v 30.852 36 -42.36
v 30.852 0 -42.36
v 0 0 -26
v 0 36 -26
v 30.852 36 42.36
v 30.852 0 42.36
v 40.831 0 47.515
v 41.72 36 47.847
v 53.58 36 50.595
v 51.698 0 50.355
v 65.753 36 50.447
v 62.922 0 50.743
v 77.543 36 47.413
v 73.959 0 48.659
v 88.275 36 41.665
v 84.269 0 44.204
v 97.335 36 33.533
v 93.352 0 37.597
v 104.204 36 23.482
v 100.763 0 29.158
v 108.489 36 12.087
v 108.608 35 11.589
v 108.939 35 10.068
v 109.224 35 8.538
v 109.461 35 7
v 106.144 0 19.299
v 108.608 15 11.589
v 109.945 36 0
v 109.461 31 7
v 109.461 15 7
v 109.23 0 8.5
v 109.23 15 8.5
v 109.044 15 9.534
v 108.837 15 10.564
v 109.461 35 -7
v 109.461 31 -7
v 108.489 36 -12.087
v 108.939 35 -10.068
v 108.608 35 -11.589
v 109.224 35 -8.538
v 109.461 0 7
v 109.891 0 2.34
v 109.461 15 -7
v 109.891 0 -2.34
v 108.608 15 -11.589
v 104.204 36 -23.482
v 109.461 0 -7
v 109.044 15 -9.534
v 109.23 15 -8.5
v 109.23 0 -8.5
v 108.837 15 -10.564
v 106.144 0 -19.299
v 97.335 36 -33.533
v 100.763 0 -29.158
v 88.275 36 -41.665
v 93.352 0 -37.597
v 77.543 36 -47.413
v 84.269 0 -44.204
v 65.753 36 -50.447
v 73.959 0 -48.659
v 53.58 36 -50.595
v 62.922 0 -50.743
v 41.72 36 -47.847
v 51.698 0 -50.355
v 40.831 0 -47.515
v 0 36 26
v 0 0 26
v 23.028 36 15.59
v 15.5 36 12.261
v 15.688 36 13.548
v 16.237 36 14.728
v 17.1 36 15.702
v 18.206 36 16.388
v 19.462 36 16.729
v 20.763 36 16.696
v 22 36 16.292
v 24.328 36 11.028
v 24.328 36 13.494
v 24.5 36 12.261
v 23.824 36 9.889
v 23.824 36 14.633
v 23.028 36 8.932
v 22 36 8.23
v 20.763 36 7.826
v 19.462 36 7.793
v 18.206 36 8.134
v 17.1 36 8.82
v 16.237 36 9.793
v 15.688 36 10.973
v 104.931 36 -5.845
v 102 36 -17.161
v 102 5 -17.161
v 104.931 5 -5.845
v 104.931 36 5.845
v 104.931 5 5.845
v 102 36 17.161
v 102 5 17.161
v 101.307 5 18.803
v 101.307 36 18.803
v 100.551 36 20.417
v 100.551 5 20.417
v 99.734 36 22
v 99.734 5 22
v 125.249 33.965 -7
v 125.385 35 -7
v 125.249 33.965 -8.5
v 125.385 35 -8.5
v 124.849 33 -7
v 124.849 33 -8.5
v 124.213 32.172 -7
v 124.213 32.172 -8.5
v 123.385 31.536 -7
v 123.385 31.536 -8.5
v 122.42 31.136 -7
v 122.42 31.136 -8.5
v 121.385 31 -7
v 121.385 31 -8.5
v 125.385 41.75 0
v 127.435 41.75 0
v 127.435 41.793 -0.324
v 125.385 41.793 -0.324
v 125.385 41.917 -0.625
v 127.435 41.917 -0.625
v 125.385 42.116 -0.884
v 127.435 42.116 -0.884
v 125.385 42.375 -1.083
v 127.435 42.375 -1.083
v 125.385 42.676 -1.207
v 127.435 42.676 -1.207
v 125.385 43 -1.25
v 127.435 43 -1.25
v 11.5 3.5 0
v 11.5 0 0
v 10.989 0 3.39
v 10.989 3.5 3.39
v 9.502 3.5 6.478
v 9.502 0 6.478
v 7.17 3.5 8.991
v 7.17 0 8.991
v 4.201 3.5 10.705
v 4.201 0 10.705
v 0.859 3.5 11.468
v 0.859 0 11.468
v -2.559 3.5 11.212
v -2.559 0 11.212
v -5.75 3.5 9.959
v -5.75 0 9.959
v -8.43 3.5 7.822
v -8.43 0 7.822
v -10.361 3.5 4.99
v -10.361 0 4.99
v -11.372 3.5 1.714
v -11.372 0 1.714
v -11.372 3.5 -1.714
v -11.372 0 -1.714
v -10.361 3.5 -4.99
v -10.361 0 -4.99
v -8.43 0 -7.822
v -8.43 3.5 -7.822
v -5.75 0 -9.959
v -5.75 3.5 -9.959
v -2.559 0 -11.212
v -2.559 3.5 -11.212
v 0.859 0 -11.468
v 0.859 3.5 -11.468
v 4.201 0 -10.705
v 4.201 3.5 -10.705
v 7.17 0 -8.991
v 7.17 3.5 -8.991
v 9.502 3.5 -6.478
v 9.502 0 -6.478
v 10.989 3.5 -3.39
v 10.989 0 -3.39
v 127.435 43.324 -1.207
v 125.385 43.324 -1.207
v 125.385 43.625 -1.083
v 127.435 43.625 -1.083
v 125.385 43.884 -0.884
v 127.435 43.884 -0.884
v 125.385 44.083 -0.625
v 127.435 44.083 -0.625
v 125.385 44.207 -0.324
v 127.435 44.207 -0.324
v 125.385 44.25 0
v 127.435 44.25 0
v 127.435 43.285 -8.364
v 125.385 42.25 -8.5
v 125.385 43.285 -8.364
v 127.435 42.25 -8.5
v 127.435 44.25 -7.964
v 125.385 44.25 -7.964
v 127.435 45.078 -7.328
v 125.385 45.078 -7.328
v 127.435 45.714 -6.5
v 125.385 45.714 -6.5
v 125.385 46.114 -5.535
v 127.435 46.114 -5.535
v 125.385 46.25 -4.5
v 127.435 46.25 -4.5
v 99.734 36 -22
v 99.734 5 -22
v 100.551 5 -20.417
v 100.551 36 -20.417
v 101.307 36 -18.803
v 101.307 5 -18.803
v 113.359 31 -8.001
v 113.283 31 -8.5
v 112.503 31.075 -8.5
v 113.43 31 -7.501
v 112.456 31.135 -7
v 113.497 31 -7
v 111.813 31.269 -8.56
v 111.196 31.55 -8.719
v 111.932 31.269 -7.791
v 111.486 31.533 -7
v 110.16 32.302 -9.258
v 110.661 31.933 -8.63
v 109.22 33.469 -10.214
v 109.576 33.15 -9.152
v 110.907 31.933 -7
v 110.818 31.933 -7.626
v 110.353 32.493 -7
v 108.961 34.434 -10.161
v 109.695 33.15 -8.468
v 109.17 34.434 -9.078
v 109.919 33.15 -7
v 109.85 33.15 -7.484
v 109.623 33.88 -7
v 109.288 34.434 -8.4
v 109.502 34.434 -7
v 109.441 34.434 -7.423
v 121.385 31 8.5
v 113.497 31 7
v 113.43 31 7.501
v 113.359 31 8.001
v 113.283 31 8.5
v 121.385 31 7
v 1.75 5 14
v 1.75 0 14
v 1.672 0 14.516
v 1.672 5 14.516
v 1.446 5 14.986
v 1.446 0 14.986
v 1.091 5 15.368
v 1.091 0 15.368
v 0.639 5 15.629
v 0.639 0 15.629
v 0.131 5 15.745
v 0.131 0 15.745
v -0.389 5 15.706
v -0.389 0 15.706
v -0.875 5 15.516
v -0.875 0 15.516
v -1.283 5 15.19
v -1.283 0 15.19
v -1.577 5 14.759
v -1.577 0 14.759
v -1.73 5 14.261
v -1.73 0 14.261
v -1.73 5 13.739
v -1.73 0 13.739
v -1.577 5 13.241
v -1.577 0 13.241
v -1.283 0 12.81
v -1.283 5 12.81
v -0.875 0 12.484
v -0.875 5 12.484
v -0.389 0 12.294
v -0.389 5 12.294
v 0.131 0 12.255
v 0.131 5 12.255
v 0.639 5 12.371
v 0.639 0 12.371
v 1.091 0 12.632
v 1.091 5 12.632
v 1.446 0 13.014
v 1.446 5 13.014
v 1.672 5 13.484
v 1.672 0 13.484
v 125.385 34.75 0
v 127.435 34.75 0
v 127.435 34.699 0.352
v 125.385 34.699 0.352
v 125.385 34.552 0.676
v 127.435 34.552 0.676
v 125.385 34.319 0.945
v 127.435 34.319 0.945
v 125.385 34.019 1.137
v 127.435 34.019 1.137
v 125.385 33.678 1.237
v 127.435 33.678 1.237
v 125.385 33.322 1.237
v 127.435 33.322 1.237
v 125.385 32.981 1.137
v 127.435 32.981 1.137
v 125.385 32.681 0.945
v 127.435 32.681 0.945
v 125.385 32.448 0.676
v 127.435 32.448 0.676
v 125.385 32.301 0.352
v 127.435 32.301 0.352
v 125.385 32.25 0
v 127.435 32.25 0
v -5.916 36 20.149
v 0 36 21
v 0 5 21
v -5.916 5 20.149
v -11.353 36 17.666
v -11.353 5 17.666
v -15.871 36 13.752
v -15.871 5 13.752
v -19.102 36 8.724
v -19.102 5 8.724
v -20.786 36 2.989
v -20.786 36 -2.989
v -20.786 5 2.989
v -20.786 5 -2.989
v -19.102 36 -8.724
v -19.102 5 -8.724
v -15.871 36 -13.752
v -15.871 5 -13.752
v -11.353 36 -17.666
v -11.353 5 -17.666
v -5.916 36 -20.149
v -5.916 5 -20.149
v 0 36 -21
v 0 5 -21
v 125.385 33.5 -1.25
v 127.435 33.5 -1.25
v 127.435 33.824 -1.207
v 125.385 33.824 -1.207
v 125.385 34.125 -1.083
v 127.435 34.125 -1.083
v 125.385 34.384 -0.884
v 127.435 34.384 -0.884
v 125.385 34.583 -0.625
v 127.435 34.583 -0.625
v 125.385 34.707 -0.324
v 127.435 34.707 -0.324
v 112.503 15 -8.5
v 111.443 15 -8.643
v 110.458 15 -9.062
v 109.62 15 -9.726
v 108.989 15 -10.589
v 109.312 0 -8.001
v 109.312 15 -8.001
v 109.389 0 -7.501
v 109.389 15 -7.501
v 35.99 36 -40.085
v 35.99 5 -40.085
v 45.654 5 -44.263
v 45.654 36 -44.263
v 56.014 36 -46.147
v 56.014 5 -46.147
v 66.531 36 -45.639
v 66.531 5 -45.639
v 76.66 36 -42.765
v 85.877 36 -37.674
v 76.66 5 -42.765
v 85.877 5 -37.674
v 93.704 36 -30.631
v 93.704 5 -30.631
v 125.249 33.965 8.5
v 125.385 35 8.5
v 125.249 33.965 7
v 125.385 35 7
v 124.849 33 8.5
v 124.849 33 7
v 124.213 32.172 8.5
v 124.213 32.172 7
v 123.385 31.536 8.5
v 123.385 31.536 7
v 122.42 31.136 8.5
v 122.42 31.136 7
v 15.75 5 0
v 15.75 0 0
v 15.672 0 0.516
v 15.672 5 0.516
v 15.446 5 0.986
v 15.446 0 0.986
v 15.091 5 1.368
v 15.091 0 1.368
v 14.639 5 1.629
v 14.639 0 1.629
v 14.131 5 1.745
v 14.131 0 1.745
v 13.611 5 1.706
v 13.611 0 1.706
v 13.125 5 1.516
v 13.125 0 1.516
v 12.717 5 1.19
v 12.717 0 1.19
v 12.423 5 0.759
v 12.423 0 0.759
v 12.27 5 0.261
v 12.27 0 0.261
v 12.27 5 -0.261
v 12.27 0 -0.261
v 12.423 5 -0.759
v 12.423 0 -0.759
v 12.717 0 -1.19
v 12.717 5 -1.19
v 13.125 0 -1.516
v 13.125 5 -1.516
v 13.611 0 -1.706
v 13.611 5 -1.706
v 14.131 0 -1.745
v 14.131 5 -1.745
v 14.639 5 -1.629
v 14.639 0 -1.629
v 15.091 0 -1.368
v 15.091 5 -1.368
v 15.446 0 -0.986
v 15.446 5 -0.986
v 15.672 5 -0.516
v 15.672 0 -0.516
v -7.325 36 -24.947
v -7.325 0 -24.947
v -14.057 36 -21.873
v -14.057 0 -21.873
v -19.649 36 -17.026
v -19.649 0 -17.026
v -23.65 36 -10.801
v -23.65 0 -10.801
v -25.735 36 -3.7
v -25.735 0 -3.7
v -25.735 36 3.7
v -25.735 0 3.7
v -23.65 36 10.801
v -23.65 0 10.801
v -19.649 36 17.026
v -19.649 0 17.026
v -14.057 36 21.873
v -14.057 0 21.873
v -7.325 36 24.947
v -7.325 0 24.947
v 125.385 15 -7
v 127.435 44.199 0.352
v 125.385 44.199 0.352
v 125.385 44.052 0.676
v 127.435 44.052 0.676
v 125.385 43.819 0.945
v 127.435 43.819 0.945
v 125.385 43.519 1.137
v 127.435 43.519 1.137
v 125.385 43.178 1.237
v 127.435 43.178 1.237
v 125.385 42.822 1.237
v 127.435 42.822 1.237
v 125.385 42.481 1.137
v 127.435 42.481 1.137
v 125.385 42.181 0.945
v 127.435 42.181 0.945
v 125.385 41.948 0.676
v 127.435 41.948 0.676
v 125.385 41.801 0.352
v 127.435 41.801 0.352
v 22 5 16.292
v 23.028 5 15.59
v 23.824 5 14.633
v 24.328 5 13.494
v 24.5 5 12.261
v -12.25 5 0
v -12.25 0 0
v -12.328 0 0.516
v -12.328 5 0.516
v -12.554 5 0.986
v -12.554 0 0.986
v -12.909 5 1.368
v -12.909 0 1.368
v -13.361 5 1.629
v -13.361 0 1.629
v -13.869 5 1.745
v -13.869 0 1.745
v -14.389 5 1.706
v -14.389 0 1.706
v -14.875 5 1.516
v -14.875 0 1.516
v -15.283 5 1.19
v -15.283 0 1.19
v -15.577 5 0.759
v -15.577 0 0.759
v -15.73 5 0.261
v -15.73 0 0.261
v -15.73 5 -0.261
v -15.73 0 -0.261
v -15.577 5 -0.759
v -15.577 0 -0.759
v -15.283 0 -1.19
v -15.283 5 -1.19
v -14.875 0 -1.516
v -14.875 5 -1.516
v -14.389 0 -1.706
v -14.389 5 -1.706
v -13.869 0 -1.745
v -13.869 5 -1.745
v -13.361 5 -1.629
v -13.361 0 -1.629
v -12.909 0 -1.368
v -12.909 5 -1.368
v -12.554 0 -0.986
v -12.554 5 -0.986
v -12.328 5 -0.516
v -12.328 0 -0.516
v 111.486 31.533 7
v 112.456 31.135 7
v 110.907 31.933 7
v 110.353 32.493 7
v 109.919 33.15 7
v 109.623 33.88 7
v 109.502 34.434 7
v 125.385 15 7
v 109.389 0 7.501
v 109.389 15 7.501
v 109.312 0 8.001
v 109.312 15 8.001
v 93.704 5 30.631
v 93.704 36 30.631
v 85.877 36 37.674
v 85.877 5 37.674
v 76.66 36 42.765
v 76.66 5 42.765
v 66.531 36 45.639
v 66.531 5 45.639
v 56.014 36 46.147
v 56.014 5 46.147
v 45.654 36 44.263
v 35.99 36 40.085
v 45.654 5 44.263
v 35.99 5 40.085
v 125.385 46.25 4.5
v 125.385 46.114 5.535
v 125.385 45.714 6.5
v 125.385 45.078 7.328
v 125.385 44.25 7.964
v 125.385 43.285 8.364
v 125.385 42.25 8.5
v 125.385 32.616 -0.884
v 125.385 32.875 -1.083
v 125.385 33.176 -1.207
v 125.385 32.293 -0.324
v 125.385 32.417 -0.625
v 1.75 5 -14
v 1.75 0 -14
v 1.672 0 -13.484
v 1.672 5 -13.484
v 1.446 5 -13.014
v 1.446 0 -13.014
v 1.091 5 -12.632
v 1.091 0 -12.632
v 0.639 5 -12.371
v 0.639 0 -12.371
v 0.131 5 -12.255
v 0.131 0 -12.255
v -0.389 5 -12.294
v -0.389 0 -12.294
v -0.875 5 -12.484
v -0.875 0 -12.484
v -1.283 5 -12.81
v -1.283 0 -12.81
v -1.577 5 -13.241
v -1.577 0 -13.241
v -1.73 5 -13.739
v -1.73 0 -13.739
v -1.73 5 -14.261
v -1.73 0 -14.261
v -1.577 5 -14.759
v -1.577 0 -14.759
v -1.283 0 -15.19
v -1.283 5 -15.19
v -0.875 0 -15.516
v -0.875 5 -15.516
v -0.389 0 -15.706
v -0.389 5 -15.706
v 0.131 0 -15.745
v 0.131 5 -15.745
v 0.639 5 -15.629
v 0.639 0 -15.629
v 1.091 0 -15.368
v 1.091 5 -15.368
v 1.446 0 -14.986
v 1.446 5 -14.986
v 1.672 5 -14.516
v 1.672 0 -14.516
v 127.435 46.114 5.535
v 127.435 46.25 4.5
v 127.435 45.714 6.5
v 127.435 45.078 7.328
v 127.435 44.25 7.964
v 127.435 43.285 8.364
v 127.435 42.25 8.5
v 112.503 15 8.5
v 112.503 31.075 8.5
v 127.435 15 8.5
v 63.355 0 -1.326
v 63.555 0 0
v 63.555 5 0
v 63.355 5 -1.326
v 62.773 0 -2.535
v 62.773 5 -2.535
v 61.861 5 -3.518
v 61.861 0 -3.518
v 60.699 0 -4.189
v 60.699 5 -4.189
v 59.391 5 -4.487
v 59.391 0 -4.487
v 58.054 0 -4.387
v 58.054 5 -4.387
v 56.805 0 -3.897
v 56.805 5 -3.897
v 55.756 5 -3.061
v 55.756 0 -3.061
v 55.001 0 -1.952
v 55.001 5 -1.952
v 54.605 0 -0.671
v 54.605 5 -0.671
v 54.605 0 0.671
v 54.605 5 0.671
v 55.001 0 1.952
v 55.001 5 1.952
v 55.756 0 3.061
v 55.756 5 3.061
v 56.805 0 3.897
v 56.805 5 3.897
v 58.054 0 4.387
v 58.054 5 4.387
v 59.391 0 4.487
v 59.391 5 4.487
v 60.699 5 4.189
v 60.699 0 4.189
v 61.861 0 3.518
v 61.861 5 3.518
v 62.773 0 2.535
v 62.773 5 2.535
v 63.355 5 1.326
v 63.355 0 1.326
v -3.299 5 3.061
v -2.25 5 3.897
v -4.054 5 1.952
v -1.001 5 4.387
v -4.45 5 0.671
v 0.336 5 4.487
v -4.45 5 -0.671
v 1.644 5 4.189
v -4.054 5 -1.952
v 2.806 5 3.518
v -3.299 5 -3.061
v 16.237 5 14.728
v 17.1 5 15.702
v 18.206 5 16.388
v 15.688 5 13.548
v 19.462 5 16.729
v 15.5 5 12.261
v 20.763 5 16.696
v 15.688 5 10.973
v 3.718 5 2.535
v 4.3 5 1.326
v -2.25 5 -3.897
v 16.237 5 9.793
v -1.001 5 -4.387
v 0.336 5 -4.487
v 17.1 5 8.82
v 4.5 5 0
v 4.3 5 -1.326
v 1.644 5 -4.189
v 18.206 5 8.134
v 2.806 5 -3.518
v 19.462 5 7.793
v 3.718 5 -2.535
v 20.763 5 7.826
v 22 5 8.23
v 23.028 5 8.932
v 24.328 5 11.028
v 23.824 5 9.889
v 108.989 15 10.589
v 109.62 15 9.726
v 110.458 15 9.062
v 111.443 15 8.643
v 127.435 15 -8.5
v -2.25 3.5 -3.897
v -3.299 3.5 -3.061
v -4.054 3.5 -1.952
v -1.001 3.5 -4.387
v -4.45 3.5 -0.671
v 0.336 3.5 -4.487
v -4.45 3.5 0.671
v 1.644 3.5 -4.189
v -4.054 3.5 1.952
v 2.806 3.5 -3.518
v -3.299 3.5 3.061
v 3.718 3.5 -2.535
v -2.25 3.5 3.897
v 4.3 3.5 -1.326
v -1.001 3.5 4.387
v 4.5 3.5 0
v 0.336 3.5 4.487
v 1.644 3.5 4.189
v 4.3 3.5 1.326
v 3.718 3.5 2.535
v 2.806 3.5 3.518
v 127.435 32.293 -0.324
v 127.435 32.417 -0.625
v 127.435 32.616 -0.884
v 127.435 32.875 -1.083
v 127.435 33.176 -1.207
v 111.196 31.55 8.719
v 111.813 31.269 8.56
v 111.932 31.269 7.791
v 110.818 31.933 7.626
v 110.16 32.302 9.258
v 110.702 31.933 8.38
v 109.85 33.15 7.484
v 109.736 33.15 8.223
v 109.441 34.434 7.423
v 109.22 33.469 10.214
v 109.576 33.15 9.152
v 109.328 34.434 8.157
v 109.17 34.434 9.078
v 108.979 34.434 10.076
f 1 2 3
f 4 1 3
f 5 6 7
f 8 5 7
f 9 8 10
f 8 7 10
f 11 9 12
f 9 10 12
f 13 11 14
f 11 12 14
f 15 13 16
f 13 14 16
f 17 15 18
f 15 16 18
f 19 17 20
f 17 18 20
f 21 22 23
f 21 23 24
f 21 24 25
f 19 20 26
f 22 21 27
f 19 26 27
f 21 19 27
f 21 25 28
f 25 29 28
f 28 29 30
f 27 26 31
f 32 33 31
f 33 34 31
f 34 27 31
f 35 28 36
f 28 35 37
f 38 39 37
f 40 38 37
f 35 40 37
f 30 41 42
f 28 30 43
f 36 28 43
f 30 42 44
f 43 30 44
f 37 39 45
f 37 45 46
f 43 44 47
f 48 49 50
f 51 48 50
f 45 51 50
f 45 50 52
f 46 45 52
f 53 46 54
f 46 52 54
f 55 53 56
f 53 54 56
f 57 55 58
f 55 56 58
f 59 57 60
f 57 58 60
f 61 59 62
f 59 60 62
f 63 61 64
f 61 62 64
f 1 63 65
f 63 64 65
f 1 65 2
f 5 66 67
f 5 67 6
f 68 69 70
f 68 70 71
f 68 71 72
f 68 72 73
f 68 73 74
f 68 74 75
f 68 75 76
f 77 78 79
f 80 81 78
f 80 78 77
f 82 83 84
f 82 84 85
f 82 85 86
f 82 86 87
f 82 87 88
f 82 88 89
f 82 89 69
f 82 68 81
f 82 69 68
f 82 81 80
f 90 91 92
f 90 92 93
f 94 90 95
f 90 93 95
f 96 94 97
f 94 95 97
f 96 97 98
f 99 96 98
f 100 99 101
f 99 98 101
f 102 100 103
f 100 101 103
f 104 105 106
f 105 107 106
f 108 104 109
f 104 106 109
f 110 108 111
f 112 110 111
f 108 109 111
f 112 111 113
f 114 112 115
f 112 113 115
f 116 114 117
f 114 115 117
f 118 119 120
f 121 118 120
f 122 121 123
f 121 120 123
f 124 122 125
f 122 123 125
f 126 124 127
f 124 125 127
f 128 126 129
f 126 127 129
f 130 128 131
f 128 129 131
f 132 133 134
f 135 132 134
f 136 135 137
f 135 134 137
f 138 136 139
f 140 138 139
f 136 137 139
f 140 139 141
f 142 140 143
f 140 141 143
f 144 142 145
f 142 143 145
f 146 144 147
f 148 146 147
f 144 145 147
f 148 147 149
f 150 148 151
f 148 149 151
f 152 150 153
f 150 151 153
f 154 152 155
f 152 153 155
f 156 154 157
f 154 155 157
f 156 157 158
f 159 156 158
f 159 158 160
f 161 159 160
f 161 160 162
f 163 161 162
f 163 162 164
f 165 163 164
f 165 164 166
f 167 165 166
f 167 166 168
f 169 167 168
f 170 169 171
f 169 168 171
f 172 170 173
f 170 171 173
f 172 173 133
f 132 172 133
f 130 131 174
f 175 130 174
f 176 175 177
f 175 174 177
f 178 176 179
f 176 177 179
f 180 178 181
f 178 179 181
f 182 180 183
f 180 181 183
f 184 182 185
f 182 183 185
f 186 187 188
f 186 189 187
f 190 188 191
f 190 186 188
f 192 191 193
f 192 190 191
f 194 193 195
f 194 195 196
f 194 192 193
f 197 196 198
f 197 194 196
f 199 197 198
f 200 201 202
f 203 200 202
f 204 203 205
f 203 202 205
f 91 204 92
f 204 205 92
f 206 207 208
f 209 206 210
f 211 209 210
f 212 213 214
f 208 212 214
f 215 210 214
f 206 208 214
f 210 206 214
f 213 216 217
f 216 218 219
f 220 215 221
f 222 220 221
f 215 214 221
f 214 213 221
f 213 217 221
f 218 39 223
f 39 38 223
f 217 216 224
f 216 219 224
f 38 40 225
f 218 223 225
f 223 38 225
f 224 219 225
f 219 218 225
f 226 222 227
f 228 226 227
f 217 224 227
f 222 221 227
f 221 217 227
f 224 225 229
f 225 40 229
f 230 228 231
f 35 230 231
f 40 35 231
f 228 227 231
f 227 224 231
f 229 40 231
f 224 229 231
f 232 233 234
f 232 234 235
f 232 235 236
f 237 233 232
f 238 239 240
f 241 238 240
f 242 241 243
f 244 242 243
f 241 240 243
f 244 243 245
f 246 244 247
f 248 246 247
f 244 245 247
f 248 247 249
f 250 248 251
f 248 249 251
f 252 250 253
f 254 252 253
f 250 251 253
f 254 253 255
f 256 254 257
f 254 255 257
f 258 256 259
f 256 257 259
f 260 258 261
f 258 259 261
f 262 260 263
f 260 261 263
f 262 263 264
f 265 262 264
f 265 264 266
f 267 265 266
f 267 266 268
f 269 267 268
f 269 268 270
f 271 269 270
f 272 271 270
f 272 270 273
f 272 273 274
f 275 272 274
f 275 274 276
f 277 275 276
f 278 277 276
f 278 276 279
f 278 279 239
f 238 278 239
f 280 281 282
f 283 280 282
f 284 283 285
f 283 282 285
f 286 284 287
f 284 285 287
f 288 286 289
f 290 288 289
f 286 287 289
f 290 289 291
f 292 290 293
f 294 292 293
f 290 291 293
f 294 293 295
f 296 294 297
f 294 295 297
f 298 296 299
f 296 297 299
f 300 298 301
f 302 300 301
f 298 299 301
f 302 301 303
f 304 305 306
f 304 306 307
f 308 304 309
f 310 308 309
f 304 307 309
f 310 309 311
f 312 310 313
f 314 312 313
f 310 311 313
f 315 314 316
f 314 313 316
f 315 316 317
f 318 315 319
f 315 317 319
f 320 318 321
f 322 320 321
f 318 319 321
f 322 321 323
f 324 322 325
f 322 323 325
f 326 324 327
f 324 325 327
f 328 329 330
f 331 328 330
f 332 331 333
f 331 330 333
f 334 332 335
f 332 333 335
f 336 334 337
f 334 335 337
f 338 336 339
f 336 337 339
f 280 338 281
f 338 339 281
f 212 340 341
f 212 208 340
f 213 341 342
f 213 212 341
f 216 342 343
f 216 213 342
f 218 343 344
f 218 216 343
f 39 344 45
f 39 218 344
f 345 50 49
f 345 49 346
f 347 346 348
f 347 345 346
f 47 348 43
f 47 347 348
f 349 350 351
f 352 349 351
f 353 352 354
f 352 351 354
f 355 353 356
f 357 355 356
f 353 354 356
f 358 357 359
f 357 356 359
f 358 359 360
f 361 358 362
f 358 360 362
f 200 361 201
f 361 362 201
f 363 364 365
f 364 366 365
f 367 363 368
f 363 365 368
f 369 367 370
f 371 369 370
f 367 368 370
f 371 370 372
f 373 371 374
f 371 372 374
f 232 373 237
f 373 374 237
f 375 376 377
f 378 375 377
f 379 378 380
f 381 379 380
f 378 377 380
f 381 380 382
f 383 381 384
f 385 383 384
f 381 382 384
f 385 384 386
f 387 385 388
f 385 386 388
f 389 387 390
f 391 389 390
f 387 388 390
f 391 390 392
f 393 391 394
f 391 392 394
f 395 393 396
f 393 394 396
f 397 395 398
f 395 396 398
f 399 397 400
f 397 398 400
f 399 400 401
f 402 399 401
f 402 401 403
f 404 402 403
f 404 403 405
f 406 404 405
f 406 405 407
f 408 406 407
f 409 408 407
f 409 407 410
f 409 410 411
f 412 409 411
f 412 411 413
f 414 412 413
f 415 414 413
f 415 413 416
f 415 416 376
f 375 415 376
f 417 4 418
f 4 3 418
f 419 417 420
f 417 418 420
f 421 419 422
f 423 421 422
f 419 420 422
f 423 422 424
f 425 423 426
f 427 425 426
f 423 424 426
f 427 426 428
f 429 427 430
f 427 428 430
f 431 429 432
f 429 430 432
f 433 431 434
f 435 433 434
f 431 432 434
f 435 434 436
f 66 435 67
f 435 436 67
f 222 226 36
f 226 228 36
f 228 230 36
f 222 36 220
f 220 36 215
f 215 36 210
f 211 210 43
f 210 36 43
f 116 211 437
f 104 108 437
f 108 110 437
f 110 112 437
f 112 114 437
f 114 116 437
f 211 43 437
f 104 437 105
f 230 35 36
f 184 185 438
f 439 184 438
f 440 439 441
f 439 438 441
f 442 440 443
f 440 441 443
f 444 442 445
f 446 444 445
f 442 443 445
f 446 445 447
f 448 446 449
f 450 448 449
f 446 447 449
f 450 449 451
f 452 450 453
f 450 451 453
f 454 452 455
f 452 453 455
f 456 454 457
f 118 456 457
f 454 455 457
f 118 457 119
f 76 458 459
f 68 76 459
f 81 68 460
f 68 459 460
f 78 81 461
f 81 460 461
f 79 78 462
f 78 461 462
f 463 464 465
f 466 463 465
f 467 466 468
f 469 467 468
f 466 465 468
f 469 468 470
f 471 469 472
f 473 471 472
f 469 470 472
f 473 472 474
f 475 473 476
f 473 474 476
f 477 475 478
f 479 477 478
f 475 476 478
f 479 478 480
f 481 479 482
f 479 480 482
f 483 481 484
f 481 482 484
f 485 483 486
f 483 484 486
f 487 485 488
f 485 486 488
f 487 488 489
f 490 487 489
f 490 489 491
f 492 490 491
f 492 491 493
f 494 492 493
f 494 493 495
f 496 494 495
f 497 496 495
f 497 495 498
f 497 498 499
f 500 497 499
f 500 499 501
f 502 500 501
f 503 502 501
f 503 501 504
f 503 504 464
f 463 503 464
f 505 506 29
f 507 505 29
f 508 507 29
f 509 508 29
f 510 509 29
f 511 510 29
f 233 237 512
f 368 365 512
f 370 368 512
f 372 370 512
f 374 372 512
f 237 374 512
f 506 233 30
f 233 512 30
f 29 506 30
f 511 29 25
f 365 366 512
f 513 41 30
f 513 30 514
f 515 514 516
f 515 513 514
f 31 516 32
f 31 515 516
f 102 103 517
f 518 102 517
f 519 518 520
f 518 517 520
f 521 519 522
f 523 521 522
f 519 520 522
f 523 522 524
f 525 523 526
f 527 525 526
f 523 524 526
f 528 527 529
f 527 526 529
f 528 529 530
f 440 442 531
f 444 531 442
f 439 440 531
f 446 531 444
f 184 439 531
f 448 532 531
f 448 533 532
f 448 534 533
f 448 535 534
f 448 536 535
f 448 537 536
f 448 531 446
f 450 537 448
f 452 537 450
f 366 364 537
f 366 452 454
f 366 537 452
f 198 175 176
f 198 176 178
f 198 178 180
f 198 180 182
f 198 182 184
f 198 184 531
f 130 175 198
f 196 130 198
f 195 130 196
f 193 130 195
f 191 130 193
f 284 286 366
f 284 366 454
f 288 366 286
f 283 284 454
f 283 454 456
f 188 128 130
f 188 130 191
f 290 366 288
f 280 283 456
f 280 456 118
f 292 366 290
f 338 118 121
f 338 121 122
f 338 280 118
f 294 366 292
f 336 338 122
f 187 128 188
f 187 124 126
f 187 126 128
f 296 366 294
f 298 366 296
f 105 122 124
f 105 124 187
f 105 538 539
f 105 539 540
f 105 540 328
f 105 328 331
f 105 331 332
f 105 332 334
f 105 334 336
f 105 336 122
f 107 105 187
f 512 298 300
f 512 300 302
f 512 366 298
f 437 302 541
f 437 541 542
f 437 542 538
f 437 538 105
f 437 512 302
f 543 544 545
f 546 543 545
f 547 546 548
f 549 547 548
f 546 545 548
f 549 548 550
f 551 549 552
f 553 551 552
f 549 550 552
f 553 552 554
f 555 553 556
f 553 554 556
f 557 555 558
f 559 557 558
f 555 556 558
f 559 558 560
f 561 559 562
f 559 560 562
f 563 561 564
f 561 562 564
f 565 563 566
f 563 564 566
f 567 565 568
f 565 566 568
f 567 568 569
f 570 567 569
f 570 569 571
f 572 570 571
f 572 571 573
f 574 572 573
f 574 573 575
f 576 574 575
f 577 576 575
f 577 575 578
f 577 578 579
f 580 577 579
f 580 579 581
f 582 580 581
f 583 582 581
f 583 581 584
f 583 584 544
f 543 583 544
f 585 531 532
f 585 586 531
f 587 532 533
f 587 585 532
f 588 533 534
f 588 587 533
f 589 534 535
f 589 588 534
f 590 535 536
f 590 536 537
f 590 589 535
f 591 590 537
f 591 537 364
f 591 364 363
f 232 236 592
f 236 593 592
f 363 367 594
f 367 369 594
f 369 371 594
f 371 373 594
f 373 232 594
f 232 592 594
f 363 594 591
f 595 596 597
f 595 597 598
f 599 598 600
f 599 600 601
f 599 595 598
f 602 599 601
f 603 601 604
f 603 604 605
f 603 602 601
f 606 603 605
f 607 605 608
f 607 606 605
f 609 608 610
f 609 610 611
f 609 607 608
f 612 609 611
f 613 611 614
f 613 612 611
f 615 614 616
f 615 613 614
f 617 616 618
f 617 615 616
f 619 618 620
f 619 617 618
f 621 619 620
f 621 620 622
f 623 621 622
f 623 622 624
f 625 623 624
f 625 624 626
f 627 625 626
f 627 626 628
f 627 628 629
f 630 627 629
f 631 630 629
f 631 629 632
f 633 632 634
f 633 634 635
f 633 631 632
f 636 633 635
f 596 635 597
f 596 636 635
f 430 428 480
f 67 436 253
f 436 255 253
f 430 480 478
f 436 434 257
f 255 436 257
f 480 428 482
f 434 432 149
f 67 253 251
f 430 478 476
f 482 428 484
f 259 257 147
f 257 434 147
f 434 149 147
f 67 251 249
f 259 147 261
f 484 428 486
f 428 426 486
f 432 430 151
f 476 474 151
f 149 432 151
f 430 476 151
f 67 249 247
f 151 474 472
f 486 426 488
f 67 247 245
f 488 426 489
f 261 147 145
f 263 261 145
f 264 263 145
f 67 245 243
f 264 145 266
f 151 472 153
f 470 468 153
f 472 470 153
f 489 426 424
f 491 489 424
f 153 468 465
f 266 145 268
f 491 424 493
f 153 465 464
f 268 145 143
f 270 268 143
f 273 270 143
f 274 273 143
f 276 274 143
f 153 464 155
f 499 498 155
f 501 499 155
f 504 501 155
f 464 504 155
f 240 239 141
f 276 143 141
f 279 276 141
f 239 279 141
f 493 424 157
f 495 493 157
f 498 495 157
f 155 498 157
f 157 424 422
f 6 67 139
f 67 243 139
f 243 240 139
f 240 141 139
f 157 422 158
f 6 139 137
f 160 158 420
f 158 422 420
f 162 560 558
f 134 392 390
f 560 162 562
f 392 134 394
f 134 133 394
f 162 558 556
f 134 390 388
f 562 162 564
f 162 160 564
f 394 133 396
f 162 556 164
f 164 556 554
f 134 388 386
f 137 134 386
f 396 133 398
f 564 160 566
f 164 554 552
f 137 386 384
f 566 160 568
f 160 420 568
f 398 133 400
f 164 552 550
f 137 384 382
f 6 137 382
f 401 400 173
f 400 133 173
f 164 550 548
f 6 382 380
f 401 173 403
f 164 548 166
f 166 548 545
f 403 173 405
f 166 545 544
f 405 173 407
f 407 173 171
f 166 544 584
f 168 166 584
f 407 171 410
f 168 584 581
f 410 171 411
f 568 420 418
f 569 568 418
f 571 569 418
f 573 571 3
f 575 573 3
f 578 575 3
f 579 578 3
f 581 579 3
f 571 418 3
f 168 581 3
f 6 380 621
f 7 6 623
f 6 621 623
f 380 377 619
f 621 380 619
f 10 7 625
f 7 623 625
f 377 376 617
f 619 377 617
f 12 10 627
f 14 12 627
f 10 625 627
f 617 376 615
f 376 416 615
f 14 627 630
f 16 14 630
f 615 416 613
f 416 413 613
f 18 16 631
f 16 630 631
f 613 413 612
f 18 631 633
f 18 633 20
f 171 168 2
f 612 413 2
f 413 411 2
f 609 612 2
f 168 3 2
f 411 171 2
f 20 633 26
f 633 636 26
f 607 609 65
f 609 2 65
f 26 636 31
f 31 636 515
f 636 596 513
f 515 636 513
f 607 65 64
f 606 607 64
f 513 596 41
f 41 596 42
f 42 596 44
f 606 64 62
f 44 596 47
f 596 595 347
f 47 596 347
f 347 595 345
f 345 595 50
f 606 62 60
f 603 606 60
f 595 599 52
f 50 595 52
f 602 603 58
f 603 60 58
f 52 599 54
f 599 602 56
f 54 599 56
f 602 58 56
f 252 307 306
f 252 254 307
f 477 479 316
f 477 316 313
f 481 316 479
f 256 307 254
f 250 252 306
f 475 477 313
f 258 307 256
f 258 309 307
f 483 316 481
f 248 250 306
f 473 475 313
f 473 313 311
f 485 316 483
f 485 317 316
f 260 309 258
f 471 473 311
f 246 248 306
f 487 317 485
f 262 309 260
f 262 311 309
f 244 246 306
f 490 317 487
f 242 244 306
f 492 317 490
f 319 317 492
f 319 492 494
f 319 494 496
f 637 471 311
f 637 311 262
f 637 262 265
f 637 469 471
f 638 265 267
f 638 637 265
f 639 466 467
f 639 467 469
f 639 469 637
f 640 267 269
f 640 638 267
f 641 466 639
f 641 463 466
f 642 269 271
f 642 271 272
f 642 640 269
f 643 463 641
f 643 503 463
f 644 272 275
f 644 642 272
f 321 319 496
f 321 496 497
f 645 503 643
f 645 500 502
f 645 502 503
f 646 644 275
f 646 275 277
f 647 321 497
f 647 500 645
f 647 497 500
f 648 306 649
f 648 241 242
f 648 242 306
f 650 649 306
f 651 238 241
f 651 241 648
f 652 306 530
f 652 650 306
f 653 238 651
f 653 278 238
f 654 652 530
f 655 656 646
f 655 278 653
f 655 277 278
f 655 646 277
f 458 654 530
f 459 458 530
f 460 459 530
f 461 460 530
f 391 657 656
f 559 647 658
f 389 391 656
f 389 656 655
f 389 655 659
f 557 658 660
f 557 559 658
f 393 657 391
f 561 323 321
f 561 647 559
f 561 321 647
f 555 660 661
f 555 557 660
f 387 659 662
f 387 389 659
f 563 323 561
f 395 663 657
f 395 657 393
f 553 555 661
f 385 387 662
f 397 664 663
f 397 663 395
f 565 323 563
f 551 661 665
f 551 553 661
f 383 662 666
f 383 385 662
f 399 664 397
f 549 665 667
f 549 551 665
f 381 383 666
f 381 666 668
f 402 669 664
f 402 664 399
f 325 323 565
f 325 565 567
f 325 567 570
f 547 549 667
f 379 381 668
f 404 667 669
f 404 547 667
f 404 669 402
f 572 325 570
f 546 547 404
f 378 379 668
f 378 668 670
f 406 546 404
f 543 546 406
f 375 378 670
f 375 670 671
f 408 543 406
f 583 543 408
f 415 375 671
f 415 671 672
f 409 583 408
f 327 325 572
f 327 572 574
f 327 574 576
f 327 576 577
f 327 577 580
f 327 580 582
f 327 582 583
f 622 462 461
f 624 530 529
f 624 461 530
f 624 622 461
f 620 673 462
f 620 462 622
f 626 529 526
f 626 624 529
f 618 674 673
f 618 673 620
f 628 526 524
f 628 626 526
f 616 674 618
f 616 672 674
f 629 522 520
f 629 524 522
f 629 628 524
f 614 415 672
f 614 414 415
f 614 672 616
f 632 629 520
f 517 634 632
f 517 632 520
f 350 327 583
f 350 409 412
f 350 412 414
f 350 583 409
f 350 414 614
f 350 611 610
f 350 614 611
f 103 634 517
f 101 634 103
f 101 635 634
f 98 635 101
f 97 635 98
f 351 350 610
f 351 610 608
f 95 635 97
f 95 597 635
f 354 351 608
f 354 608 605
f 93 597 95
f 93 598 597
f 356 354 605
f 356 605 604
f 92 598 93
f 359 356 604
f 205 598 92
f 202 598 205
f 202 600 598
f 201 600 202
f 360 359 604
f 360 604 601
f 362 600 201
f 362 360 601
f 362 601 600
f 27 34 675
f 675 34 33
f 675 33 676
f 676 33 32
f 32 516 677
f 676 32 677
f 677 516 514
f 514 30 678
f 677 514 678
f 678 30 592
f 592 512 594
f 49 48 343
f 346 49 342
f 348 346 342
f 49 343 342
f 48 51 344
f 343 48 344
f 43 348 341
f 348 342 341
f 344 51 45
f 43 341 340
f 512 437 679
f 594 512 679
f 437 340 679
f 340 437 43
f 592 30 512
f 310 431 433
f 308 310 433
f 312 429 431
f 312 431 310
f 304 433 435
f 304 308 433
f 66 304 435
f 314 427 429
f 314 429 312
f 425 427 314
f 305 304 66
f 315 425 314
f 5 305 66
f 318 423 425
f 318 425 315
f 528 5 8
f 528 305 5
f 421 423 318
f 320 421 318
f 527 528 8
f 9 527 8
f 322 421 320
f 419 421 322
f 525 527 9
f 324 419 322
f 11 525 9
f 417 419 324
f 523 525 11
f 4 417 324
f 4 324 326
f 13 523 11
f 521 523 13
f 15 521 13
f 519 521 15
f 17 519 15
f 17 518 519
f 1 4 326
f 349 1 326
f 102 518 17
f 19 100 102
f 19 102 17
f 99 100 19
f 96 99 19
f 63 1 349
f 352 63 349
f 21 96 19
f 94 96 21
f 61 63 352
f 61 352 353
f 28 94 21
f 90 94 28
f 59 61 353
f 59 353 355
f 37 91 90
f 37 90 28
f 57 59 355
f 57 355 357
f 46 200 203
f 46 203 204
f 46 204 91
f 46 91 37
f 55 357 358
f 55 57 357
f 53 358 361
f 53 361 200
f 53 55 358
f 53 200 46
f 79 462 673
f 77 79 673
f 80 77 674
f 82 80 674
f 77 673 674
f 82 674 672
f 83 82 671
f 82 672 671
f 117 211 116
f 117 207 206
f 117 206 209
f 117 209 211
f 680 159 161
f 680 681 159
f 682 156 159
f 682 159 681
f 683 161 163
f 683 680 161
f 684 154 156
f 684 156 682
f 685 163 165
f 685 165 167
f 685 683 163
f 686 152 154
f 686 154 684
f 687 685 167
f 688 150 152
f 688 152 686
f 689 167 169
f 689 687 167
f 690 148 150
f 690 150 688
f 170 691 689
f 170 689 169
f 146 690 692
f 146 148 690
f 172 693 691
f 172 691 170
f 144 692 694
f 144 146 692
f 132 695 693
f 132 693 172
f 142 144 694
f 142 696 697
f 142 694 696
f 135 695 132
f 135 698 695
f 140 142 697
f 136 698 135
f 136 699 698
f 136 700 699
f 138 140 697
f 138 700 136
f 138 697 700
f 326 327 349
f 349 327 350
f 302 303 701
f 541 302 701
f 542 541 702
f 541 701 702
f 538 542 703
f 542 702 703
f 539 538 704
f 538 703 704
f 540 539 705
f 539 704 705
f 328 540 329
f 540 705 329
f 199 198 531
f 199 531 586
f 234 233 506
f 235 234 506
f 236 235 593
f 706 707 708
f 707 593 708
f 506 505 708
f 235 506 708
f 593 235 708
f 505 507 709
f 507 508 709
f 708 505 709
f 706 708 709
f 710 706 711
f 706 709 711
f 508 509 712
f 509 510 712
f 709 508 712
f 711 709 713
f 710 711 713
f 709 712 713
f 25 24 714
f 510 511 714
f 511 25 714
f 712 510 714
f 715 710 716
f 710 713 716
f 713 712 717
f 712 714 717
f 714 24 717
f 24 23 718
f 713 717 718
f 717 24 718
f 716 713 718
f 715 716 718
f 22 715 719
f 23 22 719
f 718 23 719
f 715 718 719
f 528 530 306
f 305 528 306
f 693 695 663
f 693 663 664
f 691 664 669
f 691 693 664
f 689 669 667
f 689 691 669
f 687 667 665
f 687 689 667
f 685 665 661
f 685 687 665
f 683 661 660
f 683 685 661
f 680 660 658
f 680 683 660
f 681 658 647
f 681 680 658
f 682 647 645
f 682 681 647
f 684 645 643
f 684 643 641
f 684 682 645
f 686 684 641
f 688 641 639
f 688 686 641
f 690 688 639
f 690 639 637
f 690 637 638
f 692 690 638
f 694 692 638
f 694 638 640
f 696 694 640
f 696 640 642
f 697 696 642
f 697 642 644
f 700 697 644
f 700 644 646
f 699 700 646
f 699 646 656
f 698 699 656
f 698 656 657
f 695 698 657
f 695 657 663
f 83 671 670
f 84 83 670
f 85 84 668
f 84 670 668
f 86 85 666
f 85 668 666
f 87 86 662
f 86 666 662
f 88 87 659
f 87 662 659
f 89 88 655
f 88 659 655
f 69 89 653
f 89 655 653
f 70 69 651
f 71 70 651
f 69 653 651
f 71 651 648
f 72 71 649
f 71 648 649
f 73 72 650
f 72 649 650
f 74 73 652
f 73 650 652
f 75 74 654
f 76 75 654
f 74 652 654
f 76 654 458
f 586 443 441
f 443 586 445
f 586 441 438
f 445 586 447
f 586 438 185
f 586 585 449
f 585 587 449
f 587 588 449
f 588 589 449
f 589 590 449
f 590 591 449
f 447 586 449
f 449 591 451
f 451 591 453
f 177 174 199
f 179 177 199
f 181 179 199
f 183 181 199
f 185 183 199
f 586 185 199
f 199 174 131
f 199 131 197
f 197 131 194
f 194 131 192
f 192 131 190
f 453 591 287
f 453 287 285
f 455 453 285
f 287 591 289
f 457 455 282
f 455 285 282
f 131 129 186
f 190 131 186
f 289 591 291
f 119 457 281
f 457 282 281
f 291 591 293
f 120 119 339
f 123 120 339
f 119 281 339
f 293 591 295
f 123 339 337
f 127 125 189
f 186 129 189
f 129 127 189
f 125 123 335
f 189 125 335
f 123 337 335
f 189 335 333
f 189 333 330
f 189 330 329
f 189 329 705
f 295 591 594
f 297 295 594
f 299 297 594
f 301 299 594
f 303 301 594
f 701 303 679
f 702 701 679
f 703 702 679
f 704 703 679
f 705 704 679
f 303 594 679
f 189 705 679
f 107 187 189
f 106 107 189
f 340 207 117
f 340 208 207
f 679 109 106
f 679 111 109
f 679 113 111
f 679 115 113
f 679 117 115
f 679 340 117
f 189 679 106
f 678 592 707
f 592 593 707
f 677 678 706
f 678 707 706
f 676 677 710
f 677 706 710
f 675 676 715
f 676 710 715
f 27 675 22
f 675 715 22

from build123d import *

# Parameters (mm, degrees)
SKETCH2_R           = 4.5
BOSS_EXTRUDE1_DEPTH = 5
BOSS_EXTRUDE4_DEPTH = 31
BOSS_EXTRUDE5_DEPTH = 31
BOSS_EXTRUDE6_DEPTH = 31
SKETCH5_W           = 2.05
SKETCH5_H           = 17
BOSS_EXTRUDE7_DEPTH = 15.25
CUT_EXTRUDE3_DEPTH  = 5
CUT_EXTRUDE4_DEPTH  = 15
FILLET2_R           = 4
SKETCH8_R           = 1.75
CUT_EXTRUDE5_DEPTH  = 10
SKETCH8_3_R         = 11.5
SKETCH8_3_R_2       = 4.5
CUT_EXTRUDE6_DEPTH  = 3.5
BOSS_EXTRUDE8_DEPTH = 31


with BuildPart() as part:
    # Sketch2 → Boss-Extrude1 (new body)
    with BuildSketch(Plane(origin=(0, 0, 0), x_dir=(1, 0, 0), z_dir=(0, 1, 0))):
        with BuildLine():
            Line((30.852324511, 42.360372936), (0, 26))
            ThreePointArc((0, 26), (-26, 0), (0, -26))
            Line((0, -26), (30.852324511, -42.360372936))
            ThreePointArc((30.852324511, -42.360372936), (109.945, 0), (30.852324511, 42.360372936))
        make_face()
        Circle(SKETCH2_R, mode=Mode.SUBTRACT)
        with Locations((59.055, 0)):
            Circle(SKETCH2_R, mode=Mode.SUBTRACT)
    extrude(amount=BOSS_EXTRUDE1_DEPTH)

    # Sketch3 → Boss-Extrude4 (add)
    with BuildSketch(Plane(origin=(0, 5, 0), x_dir=(1, 0, 0), z_dir=(0, 1, 0))):
        with BuildLine():
            Line((30.852324511, 42.360372936), (0, 26))
            ThreePointArc((0, 26), (-26, 0), (0, -26))
            Line((0, -26), (30.852324511, -42.360372936))
            ThreePointArc((30.852324511, -42.360372936), (109.945, 0), (30.852324511, 42.360372936))
        make_face()
        with BuildLine():
            ThreePointArc((0, -21), (-21, 0), (0, 21))
            Line((0, 21), (35.989825914, 40.084687562))
            ThreePointArc((35.989825914, 40.084687562), (71.67744287, 44.491104375), (99.734041687, 22))
            Line((99.734041687, 22), (102, 22))
            Line((102, 22), (102, 17.161334667))
            ThreePointArc((102, 17.161334667), (105.301993768, 0), (102, -17.161334667))
            Line((102, -17.161334667), (102, -22))
            Line((102, -22), (99.734041687, -22))
            ThreePointArc((99.734041687, -22), (71.67744287, -44.491104375), (35.989825914, -40.084687562))
            Line((35.989825914, -40.084687562), (0, -21))
        make_face(mode=Mode.SUBTRACT)
    extrude(amount=BOSS_EXTRUDE4_DEPTH)

    # Sketch3<10> → Boss-Extrude5 (add)
    with BuildSketch(Plane(origin=(0, 5, 0), x_dir=(1, 0, 0), z_dir=(0, 1, 0))):
        with BuildLine():
            Line((102, 22), (99.734041687, 22))
            ThreePointArc((99.734041687, 22), (100.936956229, 19.613418238), (102, 17.161334667))
            Line((102, 17.161334667), (102, 22))
        make_face()
        with BuildLine():
            ThreePointArc((102, -17.161334667), (100.936956229, -19.613418238), (99.734041687, -22))
            Line((99.734041687, -22), (102, -22))
            Line((102, -22), (102, -17.161334667))
        make_face()
    extrude(amount=BOSS_EXTRUDE5_DEPTH)

    # Sketch2<6> → Boss-Extrude6 (add)
    with BuildSketch(Plane(origin=(0, 0, 0), x_dir=(1, 0, 0), z_dir=(0, 1, 0))):
        with BuildLine():
            Line((127.435, 8.5), (109.23011435, 8.5))
            ThreePointArc((109.23011435, 8.5), (109.351284572, 7.750861777), (109.461270443, 7))
            Line((109.461270443, 7), (125.385, 7))
            Line((125.385, 7), (125.385, 0))
            Line((125.385, 0), (127.435, 0))
            Line((127.435, 0), (127.435, 8.5))
        make_face()
        with BuildLine():
            Line((127.435, -8.5), (127.435, 0))
            Line((127.435, 0), (125.385, 0))
            Line((125.385, 0), (125.385, -7))
            Line((125.385, -7), (109.461270443, -7))
            ThreePointArc((109.461270443, -7), (109.351284572, -7.750861777), (109.23011435, -8.5))
            Line((109.23011435, -8.5), (127.435, -8.5))
        make_face()
    extrude(amount=BOSS_EXTRUDE6_DEPTH)

    # Sketch5 → Boss-Extrude7 (add)
    with BuildSketch(Plane(origin=(0, 31, 0), x_dir=(1, 0, 0), z_dir=(0, 1, 0))):
        with Locations((126.41, 0)):
            Rectangle(SKETCH5_W, SKETCH5_H)
    extrude(amount=BOSS_EXTRUDE7_DEPTH)

    # Sketch6 → Cut-Extrude3 (cut)
    with BuildSketch(Plane(origin=(127.435, 0, 0), x_dir=(0, 0, -1), z_dir=(1, 0, 0))):
        with BuildLine():
            ThreePointArc((1.25, 43), (0.883883476, 43.883883476), (0, 44.25))
            Line((0, 44.25), (0, 41.75))
            ThreePointArc((0, 41.75), (0.883883476, 42.116116524), (1.25, 43))
        make_face()
        with BuildLine():
            Line((0, 41.75), (0, 44.25))
            ThreePointArc((0, 44.25), (-1.25, 43), (0, 41.75))
        make_face()
        with BuildLine():
            ThreePointArc((1.25, 33.5), (0.883883476, 34.383883476), (0, 34.75))
            Line((0, 34.75), (0, 32.25))
            ThreePointArc((0, 32.25), (0.883883476, 32.616116524), (1.25, 33.5))
        make_face()
        with BuildLine():
            Line((0, 32.25), (0, 34.75))
            ThreePointArc((0, 34.75), (-1.25, 33.5), (0, 32.25))
        make_face()
    extrude(amount=-CUT_EXTRUDE3_DEPTH, mode=Mode.SUBTRACT)

    # Sketch2<7> → Cut-Extrude4 (cut)
    with BuildSketch(Plane(origin=(0, 0, 0), x_dir=(1, 0, 0), z_dir=(0, 1, 0))):
        with BuildLine():
            Line((127.435, -8.5), (127.435, 0))
            Line((127.435, 0), (125.385, 0))
            Line((125.385, 0), (125.385, -7))
            Line((125.385, -7), (109.461270443, -7))
            ThreePointArc((109.461270443, -7), (109.351284572, -7.750861777), (109.23011435, -8.5))
            Line((109.23011435, -8.5), (127.435, -8.5))
        make_face()
        with BuildLine():
            Line((127.435, 8.5), (109.23011435, 8.5))
            ThreePointArc((109.23011435, 8.5), (109.351284572, 7.750861777), (109.461270443, 7))
            Line((109.461270443, 7), (125.385, 7))
            Line((125.385, 7), (125.385, 0))
            Line((125.385, 0), (127.435, 0))
            Line((127.435, 0), (127.435, 8.5))
        make_face()
    extrude(amount=CUT_EXTRUDE4_DEPTH, mode=Mode.SUBTRACT)

    # Fillet2
    fillet2_edges = [part.edges().sort_by_distance(p)[0] for p in [
        (125.385, 31, 7.75),
        (125.385, 31, -7.75),
        (126.41, 46.25, -8.5),
        (126.41, 46.25, 8.5),
        (109.351284572, 31, -7.750861777),
        (109.23011435, 23, -8.5),
        (109.351284572, 31, 7.750861777),
        (109.23011435, 23, 8.5),
    ]]
    fillet(fillet2_edges, radius=FILLET2_R)

    # Sketch8 → Cut-Extrude5 (cut)
    with BuildSketch(Plane.XZ):
        with Locations((0, 14)):
            Circle(SKETCH8_R)
        with Locations((14, 0)):
            Circle(SKETCH8_R)
        with Locations((0, -14)):
            Circle(SKETCH8_R)
        with Locations((-14, 0)):
            Circle(SKETCH8_R)
    extrude(amount=-CUT_EXTRUDE5_DEPTH, mode=Mode.SUBTRACT)

    # Sketch8<3> → Cut-Extrude6 (cut)
    with BuildSketch(Plane.XZ):
        Circle(SKETCH8_3_R)
        Circle(SKETCH8_3_R_2, mode=Mode.SUBTRACT)
    extrude(amount=-CUT_EXTRUDE6_DEPTH, mode=Mode.SUBTRACT)

    # Sketch3<13> → Boss-Extrude8 (add)
    with BuildSketch(Plane(origin=(0, 5, 0), x_dir=(1, 0, 0), z_dir=(0, 1, 0))):
        with BuildLine():
            ThreePointArc((24.5, -12.260820261), (23.824264635, -9.889112016), (22, -8.229691387))
            Line((22, -8.229691387), (22, -16.291949135))
            ThreePointArc((22, -16.291949135), (23.824264635, -14.632528506), (24.5, -12.260820261))
        make_face()
        with BuildLine():
            Line((22, -16.291949135), (22, -8.229691387))
            ThreePointArc((22, -8.229691387), (15.5, -12.260820261), (22, -16.291949135))
        make_face()
    extrude(amount=BOSS_EXTRUDE8_DEPTH)


solid = part.part
